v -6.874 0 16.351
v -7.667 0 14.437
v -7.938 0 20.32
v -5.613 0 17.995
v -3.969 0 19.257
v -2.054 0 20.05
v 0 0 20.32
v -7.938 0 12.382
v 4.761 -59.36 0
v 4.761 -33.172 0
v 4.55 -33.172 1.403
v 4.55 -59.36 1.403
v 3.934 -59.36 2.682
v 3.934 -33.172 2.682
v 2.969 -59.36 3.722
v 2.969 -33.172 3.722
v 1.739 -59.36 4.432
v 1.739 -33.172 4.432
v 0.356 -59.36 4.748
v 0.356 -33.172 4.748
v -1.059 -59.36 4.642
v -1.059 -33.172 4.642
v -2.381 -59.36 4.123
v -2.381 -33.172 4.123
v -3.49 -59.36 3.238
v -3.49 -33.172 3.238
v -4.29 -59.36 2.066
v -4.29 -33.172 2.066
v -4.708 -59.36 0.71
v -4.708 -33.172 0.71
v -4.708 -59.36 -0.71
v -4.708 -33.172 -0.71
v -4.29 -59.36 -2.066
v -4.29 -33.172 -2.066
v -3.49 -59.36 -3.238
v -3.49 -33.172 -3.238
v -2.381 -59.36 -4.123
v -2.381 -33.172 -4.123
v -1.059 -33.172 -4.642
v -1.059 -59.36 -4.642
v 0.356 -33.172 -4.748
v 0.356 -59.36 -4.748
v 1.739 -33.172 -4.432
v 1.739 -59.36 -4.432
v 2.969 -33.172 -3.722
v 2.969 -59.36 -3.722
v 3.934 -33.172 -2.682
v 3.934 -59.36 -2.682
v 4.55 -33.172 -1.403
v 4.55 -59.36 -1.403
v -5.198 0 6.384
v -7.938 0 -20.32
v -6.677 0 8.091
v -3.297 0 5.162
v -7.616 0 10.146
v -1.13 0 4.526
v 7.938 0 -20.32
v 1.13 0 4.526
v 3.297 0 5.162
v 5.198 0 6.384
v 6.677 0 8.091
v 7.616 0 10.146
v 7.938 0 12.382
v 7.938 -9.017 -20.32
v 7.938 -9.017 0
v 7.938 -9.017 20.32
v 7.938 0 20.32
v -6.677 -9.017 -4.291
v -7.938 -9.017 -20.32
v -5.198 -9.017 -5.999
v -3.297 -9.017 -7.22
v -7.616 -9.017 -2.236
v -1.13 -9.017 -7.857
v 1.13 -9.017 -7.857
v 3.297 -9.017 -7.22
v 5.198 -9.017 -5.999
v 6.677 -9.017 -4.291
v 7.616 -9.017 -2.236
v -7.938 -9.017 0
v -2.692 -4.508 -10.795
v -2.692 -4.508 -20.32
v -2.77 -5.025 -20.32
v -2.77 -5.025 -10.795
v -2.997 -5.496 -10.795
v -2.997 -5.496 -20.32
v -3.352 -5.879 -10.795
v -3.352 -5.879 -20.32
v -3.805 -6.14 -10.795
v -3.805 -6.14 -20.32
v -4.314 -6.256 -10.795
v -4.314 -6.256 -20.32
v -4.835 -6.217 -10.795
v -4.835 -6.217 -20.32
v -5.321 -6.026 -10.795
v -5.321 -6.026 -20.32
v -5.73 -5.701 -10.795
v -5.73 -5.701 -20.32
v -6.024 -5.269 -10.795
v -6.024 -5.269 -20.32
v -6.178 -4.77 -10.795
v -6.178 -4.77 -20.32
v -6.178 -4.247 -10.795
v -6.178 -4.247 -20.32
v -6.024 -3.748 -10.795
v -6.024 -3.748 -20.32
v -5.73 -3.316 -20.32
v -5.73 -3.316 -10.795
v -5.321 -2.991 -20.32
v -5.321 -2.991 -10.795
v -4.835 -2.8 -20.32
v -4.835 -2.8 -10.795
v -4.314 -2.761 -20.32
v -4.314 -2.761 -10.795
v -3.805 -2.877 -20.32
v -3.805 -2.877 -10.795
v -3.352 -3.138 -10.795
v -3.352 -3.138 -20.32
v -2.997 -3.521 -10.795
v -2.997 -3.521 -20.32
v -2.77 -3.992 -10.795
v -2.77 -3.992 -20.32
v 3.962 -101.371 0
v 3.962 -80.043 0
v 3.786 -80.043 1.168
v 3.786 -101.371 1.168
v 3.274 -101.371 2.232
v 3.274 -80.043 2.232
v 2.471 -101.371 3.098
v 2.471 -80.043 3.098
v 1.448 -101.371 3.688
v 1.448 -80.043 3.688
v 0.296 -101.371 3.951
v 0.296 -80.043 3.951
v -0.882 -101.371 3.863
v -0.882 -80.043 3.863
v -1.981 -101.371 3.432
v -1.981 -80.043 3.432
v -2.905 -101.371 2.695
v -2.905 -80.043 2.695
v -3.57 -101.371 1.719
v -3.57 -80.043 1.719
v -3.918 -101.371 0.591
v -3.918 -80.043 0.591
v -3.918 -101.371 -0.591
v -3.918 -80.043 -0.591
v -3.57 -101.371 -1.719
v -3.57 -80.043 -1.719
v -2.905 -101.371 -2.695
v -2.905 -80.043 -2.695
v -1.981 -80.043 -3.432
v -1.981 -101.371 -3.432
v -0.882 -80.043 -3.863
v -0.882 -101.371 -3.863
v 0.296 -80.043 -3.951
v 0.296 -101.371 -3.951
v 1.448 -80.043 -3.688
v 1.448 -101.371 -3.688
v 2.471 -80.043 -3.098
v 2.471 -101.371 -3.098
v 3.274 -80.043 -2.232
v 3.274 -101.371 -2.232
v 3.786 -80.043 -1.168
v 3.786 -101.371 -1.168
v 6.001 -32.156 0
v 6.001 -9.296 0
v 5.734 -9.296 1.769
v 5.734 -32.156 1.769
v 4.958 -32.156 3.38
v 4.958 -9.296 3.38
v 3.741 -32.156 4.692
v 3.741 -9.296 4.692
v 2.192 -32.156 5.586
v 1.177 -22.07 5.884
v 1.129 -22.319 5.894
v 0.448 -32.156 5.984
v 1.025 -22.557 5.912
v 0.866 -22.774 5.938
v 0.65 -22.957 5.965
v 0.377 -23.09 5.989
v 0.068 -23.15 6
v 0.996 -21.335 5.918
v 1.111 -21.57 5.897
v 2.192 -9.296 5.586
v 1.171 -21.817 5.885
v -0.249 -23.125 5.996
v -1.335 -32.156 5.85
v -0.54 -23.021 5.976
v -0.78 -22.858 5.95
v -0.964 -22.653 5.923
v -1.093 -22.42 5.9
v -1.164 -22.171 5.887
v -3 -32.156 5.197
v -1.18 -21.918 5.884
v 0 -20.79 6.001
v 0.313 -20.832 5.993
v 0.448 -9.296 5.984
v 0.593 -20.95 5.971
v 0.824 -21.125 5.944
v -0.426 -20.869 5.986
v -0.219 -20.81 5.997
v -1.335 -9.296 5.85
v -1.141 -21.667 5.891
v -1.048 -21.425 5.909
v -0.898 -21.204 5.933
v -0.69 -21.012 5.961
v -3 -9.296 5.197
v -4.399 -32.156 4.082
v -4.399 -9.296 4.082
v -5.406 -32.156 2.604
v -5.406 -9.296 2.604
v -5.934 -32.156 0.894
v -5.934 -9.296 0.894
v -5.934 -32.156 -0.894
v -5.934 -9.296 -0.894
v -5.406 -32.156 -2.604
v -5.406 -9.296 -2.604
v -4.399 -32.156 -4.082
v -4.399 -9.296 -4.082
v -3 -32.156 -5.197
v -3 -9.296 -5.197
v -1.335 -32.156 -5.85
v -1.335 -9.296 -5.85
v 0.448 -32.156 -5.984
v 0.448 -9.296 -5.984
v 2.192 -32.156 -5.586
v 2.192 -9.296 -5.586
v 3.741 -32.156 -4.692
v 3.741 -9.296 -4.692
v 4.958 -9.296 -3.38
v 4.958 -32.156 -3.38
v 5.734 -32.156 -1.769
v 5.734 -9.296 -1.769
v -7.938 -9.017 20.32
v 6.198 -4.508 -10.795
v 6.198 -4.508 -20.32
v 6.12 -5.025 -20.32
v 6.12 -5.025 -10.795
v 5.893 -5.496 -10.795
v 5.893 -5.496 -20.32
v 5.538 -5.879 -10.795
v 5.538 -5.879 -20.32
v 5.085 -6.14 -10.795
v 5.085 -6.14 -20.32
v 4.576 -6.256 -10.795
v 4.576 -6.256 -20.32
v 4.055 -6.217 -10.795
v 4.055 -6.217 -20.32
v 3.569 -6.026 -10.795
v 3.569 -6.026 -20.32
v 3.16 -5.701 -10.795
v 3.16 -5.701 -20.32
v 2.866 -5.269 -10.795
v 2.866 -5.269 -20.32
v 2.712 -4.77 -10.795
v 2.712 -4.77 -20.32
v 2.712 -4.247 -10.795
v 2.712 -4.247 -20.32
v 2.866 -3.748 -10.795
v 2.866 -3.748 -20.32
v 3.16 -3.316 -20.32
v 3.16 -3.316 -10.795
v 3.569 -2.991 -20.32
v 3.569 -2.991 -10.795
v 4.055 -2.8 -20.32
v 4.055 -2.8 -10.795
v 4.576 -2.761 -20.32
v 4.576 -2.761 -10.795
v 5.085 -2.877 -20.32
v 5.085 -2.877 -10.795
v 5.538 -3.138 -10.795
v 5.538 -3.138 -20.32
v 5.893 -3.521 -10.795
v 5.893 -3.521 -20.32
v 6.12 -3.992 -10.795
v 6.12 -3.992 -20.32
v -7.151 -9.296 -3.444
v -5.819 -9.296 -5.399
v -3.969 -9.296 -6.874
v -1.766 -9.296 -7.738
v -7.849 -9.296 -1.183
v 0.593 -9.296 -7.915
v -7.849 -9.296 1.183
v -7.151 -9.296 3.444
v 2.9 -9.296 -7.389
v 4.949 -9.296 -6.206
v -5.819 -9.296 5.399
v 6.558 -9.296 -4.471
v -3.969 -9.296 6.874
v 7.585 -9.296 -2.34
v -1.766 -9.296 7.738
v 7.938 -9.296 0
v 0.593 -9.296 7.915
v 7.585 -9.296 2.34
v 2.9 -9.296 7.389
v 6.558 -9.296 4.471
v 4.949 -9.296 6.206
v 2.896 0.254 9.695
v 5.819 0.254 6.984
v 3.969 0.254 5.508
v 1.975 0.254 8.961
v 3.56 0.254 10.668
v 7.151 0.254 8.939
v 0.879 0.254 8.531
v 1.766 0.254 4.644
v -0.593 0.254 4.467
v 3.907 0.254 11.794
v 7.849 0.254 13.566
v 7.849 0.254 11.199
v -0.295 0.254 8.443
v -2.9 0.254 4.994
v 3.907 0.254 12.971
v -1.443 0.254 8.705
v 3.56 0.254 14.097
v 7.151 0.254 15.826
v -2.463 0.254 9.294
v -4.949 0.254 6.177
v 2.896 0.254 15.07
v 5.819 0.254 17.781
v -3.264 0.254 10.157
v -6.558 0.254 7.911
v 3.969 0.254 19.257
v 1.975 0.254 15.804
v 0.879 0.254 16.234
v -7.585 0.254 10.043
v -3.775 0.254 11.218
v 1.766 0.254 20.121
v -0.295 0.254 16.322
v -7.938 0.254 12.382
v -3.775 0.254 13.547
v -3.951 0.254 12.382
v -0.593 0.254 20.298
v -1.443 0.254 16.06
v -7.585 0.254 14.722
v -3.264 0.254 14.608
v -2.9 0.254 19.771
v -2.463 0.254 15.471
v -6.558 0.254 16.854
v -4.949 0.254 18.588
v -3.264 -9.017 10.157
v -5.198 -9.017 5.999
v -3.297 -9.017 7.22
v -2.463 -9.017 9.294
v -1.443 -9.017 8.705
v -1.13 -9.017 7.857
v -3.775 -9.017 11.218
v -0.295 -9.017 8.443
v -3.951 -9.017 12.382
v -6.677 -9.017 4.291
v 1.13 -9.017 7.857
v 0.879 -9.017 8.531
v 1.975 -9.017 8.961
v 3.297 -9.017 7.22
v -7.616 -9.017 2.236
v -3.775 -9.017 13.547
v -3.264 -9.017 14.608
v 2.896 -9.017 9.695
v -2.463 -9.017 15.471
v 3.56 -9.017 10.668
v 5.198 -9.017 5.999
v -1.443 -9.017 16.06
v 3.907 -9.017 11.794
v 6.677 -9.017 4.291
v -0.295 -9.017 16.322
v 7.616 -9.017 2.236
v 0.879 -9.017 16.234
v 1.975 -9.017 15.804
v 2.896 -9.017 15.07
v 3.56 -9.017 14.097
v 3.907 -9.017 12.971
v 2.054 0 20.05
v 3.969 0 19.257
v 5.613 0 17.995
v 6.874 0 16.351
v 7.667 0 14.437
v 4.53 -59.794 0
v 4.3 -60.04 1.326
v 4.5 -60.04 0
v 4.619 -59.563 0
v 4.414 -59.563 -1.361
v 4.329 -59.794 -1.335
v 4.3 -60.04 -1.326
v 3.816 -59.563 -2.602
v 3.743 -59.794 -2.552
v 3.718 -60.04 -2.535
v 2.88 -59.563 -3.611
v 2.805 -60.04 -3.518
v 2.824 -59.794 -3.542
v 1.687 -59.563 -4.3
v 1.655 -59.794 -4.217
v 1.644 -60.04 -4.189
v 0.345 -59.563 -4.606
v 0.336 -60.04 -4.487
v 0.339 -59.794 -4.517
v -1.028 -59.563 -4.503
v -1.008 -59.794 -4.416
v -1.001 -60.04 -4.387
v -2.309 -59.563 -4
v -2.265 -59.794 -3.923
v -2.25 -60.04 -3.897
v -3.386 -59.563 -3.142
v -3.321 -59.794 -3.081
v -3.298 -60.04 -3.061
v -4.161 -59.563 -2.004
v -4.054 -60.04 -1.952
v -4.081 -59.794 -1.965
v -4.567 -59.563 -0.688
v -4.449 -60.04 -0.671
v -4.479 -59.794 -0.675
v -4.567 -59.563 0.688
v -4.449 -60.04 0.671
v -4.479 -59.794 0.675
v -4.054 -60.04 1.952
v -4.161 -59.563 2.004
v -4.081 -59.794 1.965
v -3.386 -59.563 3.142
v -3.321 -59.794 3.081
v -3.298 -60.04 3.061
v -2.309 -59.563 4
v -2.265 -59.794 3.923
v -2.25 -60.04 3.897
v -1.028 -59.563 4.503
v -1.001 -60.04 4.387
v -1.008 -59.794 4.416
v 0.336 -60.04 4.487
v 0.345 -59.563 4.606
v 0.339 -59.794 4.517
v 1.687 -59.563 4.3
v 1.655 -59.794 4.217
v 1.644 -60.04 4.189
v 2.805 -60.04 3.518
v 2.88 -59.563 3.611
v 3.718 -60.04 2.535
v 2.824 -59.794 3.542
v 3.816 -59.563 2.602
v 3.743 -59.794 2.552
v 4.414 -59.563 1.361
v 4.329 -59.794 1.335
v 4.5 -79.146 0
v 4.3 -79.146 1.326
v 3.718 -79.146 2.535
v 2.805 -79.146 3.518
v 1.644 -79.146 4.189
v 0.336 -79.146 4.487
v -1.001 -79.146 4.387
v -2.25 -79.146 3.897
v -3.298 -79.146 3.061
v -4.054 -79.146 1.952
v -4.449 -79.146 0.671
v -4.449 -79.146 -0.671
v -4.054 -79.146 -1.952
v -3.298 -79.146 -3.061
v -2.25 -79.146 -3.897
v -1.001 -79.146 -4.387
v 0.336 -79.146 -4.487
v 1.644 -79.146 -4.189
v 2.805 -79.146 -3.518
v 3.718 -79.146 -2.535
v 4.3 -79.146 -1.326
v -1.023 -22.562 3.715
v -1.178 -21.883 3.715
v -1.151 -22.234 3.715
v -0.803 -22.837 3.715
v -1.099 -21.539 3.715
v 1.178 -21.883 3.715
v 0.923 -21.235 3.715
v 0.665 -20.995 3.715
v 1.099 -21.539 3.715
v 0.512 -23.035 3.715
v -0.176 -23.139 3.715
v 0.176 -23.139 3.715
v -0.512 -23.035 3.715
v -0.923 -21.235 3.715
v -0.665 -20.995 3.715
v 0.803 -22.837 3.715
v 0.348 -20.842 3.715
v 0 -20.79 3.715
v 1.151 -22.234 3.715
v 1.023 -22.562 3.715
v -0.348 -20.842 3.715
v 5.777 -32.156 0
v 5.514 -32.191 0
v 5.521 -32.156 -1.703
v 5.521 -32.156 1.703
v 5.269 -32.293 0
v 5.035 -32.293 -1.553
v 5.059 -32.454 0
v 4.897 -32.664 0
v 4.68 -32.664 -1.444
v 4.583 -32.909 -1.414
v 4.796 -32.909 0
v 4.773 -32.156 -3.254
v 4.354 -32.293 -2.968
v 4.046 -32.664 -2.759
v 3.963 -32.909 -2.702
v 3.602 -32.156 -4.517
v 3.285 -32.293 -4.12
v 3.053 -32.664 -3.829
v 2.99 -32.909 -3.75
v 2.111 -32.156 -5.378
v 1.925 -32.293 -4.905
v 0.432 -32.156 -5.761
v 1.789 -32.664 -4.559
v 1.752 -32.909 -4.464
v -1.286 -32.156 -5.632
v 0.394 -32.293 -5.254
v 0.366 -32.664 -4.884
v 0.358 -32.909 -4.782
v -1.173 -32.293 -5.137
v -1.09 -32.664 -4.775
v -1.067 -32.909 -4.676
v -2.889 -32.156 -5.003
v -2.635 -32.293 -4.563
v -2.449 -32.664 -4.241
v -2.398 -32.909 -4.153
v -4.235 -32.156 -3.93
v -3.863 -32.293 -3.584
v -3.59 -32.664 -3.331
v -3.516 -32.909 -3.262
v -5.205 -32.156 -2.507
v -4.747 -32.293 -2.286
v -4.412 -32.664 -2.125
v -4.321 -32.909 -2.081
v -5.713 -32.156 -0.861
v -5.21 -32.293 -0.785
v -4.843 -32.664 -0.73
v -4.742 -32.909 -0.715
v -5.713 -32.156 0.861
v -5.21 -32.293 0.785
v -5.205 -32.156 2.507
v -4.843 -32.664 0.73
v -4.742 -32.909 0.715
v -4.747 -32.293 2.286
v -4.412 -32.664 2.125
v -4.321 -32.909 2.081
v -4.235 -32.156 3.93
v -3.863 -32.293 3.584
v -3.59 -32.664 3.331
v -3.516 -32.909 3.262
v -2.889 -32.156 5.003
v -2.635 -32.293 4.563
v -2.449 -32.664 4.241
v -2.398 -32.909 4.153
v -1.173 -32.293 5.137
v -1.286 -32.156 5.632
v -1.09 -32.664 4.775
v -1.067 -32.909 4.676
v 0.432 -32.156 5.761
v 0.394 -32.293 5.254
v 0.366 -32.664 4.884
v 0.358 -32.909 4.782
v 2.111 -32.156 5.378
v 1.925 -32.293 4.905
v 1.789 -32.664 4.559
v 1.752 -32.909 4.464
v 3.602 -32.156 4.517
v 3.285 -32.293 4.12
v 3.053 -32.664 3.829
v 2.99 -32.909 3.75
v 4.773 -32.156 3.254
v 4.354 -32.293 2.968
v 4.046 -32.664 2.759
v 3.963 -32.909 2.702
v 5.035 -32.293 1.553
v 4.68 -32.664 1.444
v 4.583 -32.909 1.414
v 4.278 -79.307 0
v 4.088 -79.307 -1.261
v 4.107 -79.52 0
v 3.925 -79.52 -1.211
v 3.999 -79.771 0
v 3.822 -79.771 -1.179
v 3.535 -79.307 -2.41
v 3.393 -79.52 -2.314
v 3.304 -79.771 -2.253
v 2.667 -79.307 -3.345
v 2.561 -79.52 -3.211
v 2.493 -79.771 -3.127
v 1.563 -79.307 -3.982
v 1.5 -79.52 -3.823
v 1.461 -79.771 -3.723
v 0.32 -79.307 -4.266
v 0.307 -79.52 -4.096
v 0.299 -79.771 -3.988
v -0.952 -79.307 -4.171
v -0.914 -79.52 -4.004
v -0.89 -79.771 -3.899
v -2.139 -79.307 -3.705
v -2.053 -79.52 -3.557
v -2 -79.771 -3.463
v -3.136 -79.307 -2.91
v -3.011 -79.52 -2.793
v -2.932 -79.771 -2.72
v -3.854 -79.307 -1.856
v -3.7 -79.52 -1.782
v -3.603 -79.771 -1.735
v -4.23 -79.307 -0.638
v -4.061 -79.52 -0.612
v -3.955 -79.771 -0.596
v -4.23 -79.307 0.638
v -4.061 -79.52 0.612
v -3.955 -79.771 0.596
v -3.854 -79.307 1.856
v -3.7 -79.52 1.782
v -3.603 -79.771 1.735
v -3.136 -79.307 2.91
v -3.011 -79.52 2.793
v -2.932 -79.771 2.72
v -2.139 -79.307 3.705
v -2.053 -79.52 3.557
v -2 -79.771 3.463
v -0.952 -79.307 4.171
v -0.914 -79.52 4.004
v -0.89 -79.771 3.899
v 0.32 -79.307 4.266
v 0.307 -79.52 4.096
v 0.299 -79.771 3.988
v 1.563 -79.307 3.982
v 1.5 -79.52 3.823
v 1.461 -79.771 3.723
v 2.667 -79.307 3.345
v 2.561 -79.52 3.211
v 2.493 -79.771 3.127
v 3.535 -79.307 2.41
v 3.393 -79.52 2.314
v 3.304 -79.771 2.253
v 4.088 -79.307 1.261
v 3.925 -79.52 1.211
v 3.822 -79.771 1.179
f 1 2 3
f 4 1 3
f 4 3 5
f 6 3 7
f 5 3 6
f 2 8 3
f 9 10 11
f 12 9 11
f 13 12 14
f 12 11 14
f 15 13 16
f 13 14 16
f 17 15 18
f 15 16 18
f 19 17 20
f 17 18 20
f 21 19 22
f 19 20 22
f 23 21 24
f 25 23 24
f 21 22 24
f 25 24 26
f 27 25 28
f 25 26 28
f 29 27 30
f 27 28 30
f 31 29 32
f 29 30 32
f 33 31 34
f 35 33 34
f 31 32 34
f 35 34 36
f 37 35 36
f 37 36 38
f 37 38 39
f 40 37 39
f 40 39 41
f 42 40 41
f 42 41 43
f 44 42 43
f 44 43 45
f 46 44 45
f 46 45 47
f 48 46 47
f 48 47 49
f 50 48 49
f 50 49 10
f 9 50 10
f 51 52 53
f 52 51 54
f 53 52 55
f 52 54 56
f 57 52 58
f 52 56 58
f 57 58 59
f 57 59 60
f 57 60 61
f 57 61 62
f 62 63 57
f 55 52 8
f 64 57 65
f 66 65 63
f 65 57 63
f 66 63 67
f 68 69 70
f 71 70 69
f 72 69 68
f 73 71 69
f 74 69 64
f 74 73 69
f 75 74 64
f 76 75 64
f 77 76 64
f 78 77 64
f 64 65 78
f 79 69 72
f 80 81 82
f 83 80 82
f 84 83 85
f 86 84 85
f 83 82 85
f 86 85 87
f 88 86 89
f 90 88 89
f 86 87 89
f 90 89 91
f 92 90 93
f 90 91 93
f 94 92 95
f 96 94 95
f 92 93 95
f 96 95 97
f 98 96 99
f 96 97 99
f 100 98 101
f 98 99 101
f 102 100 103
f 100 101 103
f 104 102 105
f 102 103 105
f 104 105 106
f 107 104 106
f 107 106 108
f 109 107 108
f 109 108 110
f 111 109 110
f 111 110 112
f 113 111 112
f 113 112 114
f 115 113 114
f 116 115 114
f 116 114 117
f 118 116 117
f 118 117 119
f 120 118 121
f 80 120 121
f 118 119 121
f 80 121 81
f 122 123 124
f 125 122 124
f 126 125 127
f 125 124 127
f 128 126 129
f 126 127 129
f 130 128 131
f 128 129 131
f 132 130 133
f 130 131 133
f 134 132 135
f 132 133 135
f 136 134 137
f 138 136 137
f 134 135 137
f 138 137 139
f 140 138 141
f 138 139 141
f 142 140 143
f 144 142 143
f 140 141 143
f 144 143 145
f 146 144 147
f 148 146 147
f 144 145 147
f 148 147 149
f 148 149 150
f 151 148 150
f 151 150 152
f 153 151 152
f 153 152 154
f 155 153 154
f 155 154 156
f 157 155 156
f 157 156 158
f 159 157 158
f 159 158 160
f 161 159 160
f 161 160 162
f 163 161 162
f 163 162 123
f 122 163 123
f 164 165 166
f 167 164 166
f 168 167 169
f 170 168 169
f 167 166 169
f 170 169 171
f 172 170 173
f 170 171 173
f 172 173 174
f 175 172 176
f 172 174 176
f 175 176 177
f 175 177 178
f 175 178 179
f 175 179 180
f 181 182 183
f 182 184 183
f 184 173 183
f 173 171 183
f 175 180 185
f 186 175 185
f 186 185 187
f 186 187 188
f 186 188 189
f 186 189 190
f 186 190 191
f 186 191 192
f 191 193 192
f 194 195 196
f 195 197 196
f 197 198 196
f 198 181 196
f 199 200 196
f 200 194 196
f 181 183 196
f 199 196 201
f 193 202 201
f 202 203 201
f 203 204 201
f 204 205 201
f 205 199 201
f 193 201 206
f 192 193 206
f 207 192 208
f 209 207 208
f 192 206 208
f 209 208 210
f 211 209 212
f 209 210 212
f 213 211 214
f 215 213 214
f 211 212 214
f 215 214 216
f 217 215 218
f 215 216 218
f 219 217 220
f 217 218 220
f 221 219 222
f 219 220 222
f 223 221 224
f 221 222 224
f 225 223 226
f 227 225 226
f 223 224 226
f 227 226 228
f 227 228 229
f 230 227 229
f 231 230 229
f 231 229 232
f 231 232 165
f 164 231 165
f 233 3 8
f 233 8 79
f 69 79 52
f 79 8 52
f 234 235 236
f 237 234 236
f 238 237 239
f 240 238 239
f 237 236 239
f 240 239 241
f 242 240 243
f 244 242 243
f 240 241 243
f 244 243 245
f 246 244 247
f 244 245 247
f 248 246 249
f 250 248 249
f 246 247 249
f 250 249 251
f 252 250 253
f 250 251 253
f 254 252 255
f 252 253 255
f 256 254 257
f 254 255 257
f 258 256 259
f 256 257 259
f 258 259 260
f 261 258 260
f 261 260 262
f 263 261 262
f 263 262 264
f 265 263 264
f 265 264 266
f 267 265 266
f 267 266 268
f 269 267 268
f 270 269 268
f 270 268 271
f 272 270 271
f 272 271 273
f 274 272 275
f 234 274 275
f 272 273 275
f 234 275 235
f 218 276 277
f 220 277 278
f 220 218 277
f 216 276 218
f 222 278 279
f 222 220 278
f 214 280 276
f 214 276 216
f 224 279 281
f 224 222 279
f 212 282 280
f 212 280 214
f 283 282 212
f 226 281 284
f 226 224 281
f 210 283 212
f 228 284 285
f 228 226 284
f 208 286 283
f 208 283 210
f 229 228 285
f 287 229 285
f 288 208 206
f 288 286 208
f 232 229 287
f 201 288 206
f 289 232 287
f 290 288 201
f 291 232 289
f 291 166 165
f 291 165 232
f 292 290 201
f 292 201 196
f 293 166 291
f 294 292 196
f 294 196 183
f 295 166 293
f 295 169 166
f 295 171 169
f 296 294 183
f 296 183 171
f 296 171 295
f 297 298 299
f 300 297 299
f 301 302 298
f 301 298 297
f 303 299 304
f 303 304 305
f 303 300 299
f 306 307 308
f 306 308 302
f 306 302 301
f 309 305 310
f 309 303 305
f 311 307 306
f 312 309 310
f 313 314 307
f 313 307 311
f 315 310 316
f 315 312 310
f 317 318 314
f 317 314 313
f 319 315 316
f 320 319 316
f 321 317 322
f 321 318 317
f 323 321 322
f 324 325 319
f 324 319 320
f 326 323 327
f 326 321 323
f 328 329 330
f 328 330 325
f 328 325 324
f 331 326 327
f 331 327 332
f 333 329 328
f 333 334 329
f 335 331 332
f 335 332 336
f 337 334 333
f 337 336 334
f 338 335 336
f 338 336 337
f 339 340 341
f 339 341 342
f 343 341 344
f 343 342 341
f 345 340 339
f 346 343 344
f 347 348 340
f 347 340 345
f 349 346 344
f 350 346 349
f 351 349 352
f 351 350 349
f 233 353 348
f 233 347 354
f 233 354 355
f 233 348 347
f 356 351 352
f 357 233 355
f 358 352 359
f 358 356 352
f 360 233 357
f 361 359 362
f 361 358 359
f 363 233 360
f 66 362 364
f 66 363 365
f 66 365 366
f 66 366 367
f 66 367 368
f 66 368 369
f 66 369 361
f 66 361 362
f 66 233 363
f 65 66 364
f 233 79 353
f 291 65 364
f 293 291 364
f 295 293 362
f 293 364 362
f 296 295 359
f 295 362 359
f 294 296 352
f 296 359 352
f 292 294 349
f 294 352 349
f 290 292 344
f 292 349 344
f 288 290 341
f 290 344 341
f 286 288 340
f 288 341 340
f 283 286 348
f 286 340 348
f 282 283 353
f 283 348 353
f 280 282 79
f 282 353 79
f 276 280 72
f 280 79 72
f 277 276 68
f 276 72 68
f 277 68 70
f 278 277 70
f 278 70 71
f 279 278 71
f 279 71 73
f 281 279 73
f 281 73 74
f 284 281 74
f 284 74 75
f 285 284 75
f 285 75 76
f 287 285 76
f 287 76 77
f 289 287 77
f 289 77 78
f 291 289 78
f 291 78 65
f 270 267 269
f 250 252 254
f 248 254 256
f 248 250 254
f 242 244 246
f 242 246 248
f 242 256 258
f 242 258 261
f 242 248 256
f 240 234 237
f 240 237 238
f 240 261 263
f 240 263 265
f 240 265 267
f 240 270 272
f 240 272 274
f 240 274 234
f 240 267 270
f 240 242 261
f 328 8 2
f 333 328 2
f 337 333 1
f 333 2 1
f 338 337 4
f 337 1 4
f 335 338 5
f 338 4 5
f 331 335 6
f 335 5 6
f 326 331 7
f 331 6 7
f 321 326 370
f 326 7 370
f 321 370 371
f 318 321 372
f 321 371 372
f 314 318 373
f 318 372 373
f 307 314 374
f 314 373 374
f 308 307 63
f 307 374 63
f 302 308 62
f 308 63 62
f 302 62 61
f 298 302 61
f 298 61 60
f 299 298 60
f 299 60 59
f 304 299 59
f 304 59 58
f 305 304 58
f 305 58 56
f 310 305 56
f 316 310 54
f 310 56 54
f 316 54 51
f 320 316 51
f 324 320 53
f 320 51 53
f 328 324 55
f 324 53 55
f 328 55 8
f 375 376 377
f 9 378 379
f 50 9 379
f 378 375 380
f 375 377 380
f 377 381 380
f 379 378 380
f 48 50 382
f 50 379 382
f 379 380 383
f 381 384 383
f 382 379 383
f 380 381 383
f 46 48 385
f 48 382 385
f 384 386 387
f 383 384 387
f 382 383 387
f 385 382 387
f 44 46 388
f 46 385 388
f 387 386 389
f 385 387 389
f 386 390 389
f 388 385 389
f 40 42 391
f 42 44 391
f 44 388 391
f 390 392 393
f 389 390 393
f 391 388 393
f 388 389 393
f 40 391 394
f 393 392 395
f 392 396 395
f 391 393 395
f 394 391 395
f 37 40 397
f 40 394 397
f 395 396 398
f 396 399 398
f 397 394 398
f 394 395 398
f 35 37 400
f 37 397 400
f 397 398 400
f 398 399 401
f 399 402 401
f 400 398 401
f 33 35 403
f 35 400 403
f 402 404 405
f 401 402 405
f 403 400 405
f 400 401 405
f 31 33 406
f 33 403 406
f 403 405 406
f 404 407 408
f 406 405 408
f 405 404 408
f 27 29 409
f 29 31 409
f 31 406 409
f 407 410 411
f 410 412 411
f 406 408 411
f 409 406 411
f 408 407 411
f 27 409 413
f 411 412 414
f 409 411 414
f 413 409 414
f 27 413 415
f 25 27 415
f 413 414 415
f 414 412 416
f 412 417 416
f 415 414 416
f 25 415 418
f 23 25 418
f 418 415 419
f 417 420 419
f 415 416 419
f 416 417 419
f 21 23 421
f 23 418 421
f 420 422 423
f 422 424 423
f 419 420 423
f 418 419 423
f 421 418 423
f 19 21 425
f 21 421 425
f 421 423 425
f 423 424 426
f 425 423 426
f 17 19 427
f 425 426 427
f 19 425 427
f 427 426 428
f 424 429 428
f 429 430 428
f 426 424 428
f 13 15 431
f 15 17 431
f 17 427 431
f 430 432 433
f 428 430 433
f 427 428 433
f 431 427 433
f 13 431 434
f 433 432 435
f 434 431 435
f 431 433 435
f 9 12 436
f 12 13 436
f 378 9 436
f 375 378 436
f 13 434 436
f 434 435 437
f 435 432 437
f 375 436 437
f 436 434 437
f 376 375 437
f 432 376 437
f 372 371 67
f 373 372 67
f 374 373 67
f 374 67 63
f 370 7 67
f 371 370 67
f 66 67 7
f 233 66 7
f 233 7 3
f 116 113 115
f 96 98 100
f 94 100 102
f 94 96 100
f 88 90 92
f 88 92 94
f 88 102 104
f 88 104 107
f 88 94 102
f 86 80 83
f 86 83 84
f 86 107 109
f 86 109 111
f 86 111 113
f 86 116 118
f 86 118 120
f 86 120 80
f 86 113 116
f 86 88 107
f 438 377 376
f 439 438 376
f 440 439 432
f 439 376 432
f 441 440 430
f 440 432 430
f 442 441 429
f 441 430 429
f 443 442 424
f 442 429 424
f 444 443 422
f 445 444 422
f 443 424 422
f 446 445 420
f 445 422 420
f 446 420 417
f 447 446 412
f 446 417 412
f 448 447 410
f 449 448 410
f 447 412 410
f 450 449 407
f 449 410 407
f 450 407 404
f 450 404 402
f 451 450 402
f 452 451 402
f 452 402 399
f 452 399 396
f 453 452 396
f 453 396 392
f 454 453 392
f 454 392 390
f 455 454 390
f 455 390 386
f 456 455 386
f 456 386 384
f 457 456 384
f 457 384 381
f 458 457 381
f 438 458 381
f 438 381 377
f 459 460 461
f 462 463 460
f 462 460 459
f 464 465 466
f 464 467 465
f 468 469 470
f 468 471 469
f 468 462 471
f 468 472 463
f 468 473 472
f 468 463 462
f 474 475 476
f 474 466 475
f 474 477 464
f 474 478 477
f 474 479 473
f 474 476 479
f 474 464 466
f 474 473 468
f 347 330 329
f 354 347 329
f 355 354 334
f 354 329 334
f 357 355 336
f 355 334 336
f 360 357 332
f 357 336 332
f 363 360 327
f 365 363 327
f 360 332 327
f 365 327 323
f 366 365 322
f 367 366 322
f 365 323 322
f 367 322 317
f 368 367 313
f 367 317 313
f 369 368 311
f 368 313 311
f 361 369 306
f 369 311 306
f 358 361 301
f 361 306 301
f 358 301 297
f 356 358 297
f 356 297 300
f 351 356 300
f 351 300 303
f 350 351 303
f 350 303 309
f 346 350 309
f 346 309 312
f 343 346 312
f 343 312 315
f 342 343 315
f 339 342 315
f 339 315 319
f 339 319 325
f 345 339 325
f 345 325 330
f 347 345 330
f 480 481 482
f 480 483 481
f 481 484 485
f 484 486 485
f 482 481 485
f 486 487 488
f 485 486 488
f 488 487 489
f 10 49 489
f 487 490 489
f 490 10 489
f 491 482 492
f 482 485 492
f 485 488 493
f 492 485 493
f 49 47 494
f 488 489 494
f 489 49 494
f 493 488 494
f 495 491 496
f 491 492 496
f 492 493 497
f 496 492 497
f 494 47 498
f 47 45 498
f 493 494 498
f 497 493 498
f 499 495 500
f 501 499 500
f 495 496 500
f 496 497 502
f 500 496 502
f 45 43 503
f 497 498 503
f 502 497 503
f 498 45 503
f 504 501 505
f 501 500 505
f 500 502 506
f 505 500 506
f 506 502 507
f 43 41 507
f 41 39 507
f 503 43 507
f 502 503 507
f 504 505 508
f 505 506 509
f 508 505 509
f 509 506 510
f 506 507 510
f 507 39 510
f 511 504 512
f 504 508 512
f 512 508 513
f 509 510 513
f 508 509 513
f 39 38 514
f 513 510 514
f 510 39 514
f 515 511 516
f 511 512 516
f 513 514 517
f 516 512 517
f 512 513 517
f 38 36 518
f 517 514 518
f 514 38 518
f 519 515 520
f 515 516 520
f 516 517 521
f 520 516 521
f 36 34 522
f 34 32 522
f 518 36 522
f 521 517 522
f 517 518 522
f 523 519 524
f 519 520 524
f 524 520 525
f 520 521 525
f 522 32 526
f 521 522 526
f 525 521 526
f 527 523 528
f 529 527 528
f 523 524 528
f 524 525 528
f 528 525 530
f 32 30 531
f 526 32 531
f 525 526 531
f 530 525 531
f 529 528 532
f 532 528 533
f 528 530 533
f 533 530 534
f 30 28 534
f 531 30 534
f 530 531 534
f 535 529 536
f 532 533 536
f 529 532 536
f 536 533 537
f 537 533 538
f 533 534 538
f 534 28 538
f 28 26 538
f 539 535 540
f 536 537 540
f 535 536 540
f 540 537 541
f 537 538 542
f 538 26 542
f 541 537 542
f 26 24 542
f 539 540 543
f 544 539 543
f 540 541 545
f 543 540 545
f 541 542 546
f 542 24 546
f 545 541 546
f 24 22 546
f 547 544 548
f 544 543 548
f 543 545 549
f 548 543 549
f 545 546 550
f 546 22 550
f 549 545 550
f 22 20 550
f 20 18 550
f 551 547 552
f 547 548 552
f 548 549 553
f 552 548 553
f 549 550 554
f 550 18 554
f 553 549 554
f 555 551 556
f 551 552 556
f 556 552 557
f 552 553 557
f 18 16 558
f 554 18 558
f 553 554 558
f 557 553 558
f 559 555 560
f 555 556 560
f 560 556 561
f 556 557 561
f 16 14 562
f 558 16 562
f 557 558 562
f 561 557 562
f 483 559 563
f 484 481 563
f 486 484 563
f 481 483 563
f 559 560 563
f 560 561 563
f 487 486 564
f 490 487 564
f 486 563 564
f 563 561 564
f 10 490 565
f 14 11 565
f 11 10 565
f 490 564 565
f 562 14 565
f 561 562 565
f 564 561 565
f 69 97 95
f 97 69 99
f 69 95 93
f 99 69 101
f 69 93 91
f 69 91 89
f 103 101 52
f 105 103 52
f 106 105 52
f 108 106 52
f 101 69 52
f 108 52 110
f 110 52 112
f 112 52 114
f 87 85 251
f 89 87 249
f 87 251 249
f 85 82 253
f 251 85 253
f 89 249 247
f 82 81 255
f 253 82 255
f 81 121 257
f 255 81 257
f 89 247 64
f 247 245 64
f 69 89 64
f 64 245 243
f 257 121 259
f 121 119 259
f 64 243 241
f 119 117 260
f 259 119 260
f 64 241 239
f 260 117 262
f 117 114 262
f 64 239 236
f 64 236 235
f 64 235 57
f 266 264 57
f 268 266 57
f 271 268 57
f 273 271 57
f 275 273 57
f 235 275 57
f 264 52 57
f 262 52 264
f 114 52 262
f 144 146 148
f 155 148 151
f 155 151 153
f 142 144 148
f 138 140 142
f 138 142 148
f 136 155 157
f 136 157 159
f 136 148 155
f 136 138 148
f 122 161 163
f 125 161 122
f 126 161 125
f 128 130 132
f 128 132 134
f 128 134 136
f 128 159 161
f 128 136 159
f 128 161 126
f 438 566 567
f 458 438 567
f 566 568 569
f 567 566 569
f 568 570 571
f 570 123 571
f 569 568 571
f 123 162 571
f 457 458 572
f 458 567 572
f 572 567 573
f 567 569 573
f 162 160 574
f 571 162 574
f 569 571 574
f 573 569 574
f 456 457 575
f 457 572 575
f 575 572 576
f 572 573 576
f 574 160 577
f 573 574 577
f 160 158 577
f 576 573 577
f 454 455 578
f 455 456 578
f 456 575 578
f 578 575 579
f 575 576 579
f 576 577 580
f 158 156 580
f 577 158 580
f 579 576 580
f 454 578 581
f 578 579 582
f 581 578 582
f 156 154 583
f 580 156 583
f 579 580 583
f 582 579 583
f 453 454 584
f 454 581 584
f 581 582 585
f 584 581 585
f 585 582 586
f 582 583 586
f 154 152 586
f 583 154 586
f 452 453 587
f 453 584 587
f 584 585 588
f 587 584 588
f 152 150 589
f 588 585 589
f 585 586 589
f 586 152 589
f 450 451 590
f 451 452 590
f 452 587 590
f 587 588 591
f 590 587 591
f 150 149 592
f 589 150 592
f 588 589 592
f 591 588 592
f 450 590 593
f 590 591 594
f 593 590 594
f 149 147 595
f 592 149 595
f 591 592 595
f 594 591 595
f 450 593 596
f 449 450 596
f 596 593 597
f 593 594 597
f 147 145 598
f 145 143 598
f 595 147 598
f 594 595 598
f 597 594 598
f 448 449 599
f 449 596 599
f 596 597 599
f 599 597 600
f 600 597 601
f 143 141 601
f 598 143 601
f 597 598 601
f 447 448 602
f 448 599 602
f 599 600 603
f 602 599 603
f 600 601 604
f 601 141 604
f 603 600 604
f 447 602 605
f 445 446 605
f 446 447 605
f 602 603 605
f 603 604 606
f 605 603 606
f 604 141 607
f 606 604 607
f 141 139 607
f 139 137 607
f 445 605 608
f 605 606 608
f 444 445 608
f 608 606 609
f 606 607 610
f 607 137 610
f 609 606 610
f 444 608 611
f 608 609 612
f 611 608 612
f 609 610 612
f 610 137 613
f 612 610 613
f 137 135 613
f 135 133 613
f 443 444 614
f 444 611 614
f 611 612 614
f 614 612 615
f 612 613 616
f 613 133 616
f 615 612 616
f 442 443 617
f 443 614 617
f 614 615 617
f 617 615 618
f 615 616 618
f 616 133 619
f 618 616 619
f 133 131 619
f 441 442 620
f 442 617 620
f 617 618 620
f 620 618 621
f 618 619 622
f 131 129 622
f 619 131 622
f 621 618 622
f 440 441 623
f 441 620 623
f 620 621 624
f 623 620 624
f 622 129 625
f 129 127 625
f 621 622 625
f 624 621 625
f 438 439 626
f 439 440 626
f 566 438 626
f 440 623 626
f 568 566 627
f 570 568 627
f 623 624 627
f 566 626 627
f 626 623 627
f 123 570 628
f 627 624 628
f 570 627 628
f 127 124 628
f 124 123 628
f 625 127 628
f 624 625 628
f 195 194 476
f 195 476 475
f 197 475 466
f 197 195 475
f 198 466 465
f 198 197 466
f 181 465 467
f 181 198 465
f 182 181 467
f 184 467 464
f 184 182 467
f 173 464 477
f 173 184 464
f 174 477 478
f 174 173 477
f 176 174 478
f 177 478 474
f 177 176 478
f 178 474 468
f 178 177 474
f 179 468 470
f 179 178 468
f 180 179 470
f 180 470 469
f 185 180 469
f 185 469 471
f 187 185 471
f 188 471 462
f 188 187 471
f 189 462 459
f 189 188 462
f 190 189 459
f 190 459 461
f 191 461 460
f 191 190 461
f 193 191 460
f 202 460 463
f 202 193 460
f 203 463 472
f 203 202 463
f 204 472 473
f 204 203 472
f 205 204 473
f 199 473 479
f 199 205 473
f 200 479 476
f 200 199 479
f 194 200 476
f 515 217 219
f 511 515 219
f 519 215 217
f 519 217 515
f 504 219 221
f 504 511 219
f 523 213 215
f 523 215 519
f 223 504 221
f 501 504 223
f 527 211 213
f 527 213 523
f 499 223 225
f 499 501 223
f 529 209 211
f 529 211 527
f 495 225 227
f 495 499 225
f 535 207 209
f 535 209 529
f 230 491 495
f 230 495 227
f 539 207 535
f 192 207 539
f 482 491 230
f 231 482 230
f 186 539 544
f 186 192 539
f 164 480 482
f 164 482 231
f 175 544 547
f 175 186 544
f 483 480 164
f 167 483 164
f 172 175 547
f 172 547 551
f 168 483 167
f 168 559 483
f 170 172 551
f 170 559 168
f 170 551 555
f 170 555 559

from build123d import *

# Parameters (mm, degrees)
F1_DEPTH  = 9.017
F2_R      = 7.9375
F3_DEPTH  = 0.2794
F4_R      = 6.00075
F5_DEPTH  = 22.86
F6_R      = 4.76123
F7_DEPTH  = 50.0634
F8_R      = 4.49961
F9_DEPTH  = 69.85
F10_R     = 3.9624
F11_DEPTH = 92.075
F15_W     = 1.1811
F15_H     = 2.286
F17_R     = 7.9375
F18_DEPTH = 0.254
F19_R     = 3.95097
F20_DEPTH = 25.4
F21_R     = 1.7526
F22_DEPTH = 9.525


# Not quite as in the source:
# - a fillet or chamfer that OpenCascade refuses, or shapes differently, is made with other operations: its cross-section is extruded or revolved along the edge and cut away or added
# - a feature of the source that left no trace in its solid (it failed there, or was rolled back) is left out


with BuildPart() as f1:
    # F0 (on Front) → F1 (new body)
    with BuildSketch(Plane.XZ):
        Polygon((7.9375, 20.32), (0, 20.32), (-7.9375, 20.32), (-7.9375, 0), (-7.9375, -20.32), (0, -20.32), (7.9375, -20.32), (7.9375, 0), align=None)
    extrude(amount=F1_DEPTH)

    # F2 (on face) → F3 (join)
    with BuildSketch(Plane.XZ.offset(9.017)):
        Circle(F2_R)
    extrude(amount=F3_DEPTH)

    # F4 (on face) → F5 (join)
    with BuildSketch(Plane.XZ.offset(9.2964)):
        Circle(F4_R)
    extrude(amount=F5_DEPTH)

    # F6 (on face) → F7 (join)
    with BuildSketch(Plane.XZ.offset(9.2964)):
        Circle(F6_R)
    extrude(amount=F7_DEPTH)

    # F8 (on face) → F9 (join)
    with BuildSketch(Plane.XZ.offset(9.2964)):
        Circle(F8_R)
    extrude(amount=F9_DEPTH)

    # F10 (on face) → F11 (join)
    with BuildSketch(Plane.XZ.offset(9.2964)):
        Circle(F10_R)
    extrude(amount=F11_DEPTH)

    # F14: fillet of radius 1.016 on 3 edges, made by hand

    # F14_s1 → F14_t2 (revolve)
    with BuildSketch(Plane.XY):
        with BuildLine():
            ThreePointArc((5.77723, -32.1564), (5.0588095103, -32.4539795103), (4.76123, -33.1724))
            Line((4.76123, -33.1724), (4.76123, -32.1564))
            Line((4.76123, -32.1564), (5.77723, -32.1564))
        make_face()
    revolve(axis=Axis((0, -32.1564, 0), (0, 1, 0)))

    # F14_s3 → F14_t4 (revolve)
    with BuildSketch(Plane.XY):
        with BuildLine():
            ThreePointArc((4.76123, -59.3598), (4.5672677411, -59.675805019), (4.49961, -60.0403636014))
            Line((4.49961, -60.0403636014), (4.49961, -59.3598))
            Line((4.49961, -59.3598), (4.76123, -59.3598))
        make_face()
    revolve(axis=Axis((0, -59.3598, 0), (0, 1, 0)))

    # F14_s5 → F14_t6 (revolve)
    with BuildSketch(Plane.XY):
        with BuildLine():
            ThreePointArc((4.49961, -79.1464), (4.1069911866, -79.5201107955), (3.9624, -80.042511676))
            Line((3.9624, -80.042511676), (3.9624, -79.1464))
            Line((3.9624, -79.1464), (4.49961, -79.1464))
        make_face()
    revolve(axis=Axis((0, -79.1464, 0), (0, 1, 0)))

    # F15 (on Right) → F16 (revolve, cut)
    with BuildSketch(Plane.YZ):
        with Locations((-21.38045, 4.85775)):
            Rectangle(F15_W, F15_H)
    revolve(axis=Axis((0, -21.971, 4.85775), (0, 0, -1)), mode=Mode.SUBTRACT)

    # F17 (on face) → F18 (join)
    with BuildSketch(Plane(origin=(0, 0, 0), x_dir=(-1, 0, 0), z_dir=(0, 1, 0))):
        with Locations((0, 12.3825)):
            Circle(F17_R)
    extrude(amount=F18_DEPTH)

    # F19 (on face) → F20 (cut)
    with BuildSketch(Plane(origin=(0, 0.254, 0), x_dir=(-1, 0, 0), z_dir=(0, 1, 0))):
        with Locations((0, 12.3825)):
            Circle(F19_R)
    extrude(amount=-F20_DEPTH, mode=Mode.SUBTRACT)

    # F21 (on face) → F22 (cut)
    with BuildSketch(Plane(origin=(0, 0, -20.32), x_dir=(1, 0, 0), z_dir=(0, 0, -1))):
        with Locations((4.445, 4.5085)):
            Circle(F21_R)
        with Locations((-4.445, 4.5085)):
            Circle(F21_R)
    extrude(amount=-F22_DEPTH, mode=Mode.SUBTRACT)


solid = f1.part
